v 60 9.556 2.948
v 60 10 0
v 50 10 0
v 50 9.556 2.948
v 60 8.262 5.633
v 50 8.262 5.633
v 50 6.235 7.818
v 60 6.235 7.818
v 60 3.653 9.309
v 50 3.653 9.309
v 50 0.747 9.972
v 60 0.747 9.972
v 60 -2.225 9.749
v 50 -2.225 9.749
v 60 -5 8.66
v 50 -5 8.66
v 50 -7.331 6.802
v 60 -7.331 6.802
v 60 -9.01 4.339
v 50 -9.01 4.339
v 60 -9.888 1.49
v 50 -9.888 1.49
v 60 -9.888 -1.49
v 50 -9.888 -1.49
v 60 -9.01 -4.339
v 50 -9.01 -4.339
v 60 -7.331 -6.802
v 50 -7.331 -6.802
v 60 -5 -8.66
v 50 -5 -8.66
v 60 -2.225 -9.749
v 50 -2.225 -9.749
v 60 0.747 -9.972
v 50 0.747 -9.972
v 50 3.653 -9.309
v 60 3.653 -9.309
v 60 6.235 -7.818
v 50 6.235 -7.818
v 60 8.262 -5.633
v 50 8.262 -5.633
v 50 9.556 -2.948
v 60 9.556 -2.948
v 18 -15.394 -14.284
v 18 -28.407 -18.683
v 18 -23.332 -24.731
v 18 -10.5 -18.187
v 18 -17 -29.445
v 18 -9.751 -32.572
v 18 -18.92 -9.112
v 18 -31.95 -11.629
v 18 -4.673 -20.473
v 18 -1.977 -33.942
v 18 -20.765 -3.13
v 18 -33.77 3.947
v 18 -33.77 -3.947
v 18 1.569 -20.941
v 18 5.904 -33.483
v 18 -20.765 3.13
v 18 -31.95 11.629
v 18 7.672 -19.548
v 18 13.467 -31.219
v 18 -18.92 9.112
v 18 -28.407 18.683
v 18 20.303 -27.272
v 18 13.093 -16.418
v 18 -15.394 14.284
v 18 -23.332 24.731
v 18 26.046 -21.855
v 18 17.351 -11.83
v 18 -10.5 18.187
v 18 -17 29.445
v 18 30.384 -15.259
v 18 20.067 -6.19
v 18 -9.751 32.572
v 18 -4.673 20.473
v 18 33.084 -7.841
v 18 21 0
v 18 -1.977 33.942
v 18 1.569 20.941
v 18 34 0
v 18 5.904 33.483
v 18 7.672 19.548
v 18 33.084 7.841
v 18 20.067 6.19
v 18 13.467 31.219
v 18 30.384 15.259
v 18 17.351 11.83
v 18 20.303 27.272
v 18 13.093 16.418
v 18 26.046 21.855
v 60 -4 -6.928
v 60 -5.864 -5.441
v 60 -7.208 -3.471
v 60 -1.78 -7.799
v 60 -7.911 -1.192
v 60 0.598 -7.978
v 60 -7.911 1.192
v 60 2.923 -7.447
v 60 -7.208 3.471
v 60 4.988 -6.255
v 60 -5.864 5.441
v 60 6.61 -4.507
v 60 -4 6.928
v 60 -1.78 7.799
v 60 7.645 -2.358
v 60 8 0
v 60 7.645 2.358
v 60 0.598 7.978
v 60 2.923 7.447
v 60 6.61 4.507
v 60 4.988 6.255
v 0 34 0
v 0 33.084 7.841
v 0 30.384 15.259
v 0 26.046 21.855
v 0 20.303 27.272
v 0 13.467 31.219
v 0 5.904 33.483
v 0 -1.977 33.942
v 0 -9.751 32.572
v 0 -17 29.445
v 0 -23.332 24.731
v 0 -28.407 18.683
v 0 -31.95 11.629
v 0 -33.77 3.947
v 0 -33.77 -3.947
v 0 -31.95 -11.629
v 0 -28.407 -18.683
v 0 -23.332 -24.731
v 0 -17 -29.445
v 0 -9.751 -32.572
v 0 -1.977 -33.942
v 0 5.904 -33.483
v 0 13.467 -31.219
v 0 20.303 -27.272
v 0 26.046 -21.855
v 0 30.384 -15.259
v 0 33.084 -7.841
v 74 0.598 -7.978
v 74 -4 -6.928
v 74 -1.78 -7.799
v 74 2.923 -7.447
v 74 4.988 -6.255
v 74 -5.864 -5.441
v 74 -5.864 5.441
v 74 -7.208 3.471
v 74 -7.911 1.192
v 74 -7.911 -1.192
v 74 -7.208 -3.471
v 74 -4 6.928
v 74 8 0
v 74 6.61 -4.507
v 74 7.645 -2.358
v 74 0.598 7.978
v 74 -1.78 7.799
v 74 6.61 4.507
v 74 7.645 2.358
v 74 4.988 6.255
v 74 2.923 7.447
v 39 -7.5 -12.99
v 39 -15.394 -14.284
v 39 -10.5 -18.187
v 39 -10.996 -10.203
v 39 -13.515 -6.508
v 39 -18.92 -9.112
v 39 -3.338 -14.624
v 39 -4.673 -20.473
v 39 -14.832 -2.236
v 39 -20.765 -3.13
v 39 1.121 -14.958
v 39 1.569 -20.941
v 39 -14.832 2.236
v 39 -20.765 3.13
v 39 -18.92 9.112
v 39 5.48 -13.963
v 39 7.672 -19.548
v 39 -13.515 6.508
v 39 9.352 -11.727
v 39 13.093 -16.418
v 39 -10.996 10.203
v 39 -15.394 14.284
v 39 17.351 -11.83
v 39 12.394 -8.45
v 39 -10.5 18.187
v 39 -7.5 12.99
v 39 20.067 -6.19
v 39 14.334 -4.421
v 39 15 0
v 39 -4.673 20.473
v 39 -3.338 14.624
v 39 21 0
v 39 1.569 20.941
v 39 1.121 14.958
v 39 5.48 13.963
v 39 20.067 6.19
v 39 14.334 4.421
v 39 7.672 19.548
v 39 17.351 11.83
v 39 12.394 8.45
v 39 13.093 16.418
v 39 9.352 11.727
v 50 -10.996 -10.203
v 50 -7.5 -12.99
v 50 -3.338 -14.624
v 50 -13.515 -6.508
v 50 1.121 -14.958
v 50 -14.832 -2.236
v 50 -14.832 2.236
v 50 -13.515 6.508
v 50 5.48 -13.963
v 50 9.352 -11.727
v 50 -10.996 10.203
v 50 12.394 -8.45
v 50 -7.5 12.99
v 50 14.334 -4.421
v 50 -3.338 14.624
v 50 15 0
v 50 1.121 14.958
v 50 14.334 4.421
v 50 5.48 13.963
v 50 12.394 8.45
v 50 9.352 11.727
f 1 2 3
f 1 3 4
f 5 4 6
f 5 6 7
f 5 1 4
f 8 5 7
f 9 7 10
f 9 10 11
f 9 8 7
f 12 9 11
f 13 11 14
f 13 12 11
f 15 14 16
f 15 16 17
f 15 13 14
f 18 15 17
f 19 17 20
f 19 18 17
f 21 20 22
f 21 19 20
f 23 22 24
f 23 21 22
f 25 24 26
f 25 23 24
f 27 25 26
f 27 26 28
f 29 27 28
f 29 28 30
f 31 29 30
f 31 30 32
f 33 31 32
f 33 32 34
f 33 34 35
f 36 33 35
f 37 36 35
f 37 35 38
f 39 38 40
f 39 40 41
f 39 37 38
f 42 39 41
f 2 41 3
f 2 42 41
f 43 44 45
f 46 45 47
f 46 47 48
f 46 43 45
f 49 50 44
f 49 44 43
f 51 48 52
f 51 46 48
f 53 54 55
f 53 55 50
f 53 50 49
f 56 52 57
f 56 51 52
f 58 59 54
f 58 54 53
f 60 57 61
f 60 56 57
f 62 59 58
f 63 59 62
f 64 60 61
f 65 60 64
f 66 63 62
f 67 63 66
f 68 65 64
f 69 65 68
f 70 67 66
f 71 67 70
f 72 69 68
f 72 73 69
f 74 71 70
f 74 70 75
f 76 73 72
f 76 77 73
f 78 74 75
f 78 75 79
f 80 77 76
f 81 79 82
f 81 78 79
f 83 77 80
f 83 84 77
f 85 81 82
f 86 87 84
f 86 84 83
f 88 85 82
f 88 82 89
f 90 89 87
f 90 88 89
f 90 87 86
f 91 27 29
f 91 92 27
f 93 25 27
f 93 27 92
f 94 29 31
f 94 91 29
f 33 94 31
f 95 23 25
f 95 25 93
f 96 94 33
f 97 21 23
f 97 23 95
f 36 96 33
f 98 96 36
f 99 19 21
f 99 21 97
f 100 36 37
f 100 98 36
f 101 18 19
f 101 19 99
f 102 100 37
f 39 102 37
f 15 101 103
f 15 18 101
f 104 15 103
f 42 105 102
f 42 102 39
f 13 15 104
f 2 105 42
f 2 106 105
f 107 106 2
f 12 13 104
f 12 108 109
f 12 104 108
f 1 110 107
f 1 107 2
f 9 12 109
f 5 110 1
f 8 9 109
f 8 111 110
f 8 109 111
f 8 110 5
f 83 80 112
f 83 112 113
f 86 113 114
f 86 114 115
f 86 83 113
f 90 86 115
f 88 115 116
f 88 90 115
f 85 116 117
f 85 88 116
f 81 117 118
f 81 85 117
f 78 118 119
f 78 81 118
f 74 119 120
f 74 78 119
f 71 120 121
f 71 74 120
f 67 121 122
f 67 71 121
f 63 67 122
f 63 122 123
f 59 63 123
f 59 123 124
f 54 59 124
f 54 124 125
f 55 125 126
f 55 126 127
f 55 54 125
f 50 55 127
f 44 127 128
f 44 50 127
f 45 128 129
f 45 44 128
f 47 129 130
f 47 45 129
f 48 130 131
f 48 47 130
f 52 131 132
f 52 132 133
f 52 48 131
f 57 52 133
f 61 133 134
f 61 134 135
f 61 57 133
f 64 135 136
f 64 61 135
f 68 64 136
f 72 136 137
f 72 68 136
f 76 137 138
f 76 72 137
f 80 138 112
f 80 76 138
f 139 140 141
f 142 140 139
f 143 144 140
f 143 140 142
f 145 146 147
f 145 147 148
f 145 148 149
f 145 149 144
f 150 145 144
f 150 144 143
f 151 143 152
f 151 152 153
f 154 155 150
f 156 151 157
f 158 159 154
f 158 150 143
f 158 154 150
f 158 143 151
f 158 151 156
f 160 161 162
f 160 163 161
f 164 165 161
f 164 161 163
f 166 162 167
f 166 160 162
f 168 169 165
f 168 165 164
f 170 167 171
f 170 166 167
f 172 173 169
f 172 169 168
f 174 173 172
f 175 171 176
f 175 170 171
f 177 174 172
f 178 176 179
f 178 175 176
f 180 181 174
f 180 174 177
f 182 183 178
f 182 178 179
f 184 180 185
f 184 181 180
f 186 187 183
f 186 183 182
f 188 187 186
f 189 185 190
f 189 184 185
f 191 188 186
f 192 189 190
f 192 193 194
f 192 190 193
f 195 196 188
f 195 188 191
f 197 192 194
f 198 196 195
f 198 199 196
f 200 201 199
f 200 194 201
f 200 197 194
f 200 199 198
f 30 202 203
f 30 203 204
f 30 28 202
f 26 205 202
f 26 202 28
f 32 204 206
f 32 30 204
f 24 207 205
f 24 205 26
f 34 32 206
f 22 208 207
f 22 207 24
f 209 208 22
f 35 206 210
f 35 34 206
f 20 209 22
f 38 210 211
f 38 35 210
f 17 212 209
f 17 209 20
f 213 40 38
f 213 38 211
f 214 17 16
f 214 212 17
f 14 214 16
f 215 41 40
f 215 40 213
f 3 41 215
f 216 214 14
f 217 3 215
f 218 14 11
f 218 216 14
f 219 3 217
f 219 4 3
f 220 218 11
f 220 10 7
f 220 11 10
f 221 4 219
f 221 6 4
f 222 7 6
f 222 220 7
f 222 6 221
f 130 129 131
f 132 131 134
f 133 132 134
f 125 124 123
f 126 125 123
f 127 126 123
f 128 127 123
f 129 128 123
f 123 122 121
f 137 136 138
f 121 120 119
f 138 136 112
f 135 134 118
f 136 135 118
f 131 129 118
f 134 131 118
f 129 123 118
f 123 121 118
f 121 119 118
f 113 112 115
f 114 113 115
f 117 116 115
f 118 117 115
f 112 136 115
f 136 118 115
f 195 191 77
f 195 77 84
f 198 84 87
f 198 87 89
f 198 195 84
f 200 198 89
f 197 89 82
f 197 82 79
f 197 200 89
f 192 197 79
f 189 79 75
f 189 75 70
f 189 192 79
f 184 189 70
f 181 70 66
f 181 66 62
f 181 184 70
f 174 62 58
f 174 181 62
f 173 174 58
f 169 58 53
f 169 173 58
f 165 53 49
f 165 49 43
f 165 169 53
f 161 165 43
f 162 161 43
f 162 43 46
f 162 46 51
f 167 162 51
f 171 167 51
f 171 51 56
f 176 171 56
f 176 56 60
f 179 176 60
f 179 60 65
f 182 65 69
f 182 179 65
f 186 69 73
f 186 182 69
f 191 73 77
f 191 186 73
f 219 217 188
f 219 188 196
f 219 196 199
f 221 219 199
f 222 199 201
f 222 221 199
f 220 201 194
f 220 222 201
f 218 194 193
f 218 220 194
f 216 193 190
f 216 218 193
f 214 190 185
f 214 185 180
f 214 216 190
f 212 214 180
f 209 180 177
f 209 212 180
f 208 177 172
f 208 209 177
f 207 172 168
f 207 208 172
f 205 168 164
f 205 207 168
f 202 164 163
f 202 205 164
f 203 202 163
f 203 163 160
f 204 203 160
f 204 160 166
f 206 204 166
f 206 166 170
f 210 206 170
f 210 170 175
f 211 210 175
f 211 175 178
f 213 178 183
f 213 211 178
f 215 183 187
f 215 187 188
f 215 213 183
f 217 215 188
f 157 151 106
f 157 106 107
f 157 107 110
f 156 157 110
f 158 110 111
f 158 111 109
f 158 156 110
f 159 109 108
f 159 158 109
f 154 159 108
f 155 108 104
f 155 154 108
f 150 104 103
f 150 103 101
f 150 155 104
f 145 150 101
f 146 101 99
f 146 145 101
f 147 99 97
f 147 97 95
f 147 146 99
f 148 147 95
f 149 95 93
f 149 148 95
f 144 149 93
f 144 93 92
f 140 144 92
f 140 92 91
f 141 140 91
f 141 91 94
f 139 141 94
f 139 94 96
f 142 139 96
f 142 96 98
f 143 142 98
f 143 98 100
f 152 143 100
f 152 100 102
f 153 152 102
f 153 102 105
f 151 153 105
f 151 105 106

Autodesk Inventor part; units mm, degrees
ref_plane "YZ Plane" through (0, 0, 0) normal (1, 0, 0) x (0, 1, 0)
ref_plane "XZ Plane" through (0, 0, 0) normal (0, 1, 0) x (-1, 0, 0)
ref_plane "XY Plane" through (0, 0, 0) normal (0, 0, 1) x (1, 0, 0)
sketch "Sketch1" plane through (0, 0, 0) normal (0, 0, 1) x (1, 0, 0)
  line L0 (0, 0) -> (0, 34)
  line L1 (0, 34) -> (18, 34)
  line L2 (18, 34) -> (18, 0)
  line L3 (18, 0) -> (18, 21)
  line L4 (18, 21) -> (39, 21)
  line L5 (39, 21) -> (39, 0)
  line L6 (39, 0) -> (39, 15)
  line L7 (39, 15) -> (50, 15)
  line L8 (50, 15) -> (50, 0)
  line L9 (50, 0) -> (50, 10)
  line L10 (50, 10) -> (60, 10)
  line L11 (60, 10) -> (60, 0)
  line L12 (60, 0) -> (60, 8)
  line L13 (60, 8) -> (74, 8)
  line L14 (74, 8) -> (74, 0)
  line L15 (0, 0) -> (74, 0)
  line L16 (0, 0) -> (84.2736, 0) construction
  dimension "d0" = 34
  dimension "d1" = 18
  dimension "d2" = 34
  dimension "d3" = 21
  dimension "d4" = 21
  dimension "d5" = 15
  dimension "d6" = 11
  dimension "d7" = 10
  dimension "d9" = 10
  dimension "d10" = 8
  dimension "d11" = 14
revolve "Revolution1" add sketch "Sketch1" angle 360 about axis through (0, 0, 0) along (1, 0, 0)
properties part number "5 Cilindros centrales" material "Aluminum 6061"
